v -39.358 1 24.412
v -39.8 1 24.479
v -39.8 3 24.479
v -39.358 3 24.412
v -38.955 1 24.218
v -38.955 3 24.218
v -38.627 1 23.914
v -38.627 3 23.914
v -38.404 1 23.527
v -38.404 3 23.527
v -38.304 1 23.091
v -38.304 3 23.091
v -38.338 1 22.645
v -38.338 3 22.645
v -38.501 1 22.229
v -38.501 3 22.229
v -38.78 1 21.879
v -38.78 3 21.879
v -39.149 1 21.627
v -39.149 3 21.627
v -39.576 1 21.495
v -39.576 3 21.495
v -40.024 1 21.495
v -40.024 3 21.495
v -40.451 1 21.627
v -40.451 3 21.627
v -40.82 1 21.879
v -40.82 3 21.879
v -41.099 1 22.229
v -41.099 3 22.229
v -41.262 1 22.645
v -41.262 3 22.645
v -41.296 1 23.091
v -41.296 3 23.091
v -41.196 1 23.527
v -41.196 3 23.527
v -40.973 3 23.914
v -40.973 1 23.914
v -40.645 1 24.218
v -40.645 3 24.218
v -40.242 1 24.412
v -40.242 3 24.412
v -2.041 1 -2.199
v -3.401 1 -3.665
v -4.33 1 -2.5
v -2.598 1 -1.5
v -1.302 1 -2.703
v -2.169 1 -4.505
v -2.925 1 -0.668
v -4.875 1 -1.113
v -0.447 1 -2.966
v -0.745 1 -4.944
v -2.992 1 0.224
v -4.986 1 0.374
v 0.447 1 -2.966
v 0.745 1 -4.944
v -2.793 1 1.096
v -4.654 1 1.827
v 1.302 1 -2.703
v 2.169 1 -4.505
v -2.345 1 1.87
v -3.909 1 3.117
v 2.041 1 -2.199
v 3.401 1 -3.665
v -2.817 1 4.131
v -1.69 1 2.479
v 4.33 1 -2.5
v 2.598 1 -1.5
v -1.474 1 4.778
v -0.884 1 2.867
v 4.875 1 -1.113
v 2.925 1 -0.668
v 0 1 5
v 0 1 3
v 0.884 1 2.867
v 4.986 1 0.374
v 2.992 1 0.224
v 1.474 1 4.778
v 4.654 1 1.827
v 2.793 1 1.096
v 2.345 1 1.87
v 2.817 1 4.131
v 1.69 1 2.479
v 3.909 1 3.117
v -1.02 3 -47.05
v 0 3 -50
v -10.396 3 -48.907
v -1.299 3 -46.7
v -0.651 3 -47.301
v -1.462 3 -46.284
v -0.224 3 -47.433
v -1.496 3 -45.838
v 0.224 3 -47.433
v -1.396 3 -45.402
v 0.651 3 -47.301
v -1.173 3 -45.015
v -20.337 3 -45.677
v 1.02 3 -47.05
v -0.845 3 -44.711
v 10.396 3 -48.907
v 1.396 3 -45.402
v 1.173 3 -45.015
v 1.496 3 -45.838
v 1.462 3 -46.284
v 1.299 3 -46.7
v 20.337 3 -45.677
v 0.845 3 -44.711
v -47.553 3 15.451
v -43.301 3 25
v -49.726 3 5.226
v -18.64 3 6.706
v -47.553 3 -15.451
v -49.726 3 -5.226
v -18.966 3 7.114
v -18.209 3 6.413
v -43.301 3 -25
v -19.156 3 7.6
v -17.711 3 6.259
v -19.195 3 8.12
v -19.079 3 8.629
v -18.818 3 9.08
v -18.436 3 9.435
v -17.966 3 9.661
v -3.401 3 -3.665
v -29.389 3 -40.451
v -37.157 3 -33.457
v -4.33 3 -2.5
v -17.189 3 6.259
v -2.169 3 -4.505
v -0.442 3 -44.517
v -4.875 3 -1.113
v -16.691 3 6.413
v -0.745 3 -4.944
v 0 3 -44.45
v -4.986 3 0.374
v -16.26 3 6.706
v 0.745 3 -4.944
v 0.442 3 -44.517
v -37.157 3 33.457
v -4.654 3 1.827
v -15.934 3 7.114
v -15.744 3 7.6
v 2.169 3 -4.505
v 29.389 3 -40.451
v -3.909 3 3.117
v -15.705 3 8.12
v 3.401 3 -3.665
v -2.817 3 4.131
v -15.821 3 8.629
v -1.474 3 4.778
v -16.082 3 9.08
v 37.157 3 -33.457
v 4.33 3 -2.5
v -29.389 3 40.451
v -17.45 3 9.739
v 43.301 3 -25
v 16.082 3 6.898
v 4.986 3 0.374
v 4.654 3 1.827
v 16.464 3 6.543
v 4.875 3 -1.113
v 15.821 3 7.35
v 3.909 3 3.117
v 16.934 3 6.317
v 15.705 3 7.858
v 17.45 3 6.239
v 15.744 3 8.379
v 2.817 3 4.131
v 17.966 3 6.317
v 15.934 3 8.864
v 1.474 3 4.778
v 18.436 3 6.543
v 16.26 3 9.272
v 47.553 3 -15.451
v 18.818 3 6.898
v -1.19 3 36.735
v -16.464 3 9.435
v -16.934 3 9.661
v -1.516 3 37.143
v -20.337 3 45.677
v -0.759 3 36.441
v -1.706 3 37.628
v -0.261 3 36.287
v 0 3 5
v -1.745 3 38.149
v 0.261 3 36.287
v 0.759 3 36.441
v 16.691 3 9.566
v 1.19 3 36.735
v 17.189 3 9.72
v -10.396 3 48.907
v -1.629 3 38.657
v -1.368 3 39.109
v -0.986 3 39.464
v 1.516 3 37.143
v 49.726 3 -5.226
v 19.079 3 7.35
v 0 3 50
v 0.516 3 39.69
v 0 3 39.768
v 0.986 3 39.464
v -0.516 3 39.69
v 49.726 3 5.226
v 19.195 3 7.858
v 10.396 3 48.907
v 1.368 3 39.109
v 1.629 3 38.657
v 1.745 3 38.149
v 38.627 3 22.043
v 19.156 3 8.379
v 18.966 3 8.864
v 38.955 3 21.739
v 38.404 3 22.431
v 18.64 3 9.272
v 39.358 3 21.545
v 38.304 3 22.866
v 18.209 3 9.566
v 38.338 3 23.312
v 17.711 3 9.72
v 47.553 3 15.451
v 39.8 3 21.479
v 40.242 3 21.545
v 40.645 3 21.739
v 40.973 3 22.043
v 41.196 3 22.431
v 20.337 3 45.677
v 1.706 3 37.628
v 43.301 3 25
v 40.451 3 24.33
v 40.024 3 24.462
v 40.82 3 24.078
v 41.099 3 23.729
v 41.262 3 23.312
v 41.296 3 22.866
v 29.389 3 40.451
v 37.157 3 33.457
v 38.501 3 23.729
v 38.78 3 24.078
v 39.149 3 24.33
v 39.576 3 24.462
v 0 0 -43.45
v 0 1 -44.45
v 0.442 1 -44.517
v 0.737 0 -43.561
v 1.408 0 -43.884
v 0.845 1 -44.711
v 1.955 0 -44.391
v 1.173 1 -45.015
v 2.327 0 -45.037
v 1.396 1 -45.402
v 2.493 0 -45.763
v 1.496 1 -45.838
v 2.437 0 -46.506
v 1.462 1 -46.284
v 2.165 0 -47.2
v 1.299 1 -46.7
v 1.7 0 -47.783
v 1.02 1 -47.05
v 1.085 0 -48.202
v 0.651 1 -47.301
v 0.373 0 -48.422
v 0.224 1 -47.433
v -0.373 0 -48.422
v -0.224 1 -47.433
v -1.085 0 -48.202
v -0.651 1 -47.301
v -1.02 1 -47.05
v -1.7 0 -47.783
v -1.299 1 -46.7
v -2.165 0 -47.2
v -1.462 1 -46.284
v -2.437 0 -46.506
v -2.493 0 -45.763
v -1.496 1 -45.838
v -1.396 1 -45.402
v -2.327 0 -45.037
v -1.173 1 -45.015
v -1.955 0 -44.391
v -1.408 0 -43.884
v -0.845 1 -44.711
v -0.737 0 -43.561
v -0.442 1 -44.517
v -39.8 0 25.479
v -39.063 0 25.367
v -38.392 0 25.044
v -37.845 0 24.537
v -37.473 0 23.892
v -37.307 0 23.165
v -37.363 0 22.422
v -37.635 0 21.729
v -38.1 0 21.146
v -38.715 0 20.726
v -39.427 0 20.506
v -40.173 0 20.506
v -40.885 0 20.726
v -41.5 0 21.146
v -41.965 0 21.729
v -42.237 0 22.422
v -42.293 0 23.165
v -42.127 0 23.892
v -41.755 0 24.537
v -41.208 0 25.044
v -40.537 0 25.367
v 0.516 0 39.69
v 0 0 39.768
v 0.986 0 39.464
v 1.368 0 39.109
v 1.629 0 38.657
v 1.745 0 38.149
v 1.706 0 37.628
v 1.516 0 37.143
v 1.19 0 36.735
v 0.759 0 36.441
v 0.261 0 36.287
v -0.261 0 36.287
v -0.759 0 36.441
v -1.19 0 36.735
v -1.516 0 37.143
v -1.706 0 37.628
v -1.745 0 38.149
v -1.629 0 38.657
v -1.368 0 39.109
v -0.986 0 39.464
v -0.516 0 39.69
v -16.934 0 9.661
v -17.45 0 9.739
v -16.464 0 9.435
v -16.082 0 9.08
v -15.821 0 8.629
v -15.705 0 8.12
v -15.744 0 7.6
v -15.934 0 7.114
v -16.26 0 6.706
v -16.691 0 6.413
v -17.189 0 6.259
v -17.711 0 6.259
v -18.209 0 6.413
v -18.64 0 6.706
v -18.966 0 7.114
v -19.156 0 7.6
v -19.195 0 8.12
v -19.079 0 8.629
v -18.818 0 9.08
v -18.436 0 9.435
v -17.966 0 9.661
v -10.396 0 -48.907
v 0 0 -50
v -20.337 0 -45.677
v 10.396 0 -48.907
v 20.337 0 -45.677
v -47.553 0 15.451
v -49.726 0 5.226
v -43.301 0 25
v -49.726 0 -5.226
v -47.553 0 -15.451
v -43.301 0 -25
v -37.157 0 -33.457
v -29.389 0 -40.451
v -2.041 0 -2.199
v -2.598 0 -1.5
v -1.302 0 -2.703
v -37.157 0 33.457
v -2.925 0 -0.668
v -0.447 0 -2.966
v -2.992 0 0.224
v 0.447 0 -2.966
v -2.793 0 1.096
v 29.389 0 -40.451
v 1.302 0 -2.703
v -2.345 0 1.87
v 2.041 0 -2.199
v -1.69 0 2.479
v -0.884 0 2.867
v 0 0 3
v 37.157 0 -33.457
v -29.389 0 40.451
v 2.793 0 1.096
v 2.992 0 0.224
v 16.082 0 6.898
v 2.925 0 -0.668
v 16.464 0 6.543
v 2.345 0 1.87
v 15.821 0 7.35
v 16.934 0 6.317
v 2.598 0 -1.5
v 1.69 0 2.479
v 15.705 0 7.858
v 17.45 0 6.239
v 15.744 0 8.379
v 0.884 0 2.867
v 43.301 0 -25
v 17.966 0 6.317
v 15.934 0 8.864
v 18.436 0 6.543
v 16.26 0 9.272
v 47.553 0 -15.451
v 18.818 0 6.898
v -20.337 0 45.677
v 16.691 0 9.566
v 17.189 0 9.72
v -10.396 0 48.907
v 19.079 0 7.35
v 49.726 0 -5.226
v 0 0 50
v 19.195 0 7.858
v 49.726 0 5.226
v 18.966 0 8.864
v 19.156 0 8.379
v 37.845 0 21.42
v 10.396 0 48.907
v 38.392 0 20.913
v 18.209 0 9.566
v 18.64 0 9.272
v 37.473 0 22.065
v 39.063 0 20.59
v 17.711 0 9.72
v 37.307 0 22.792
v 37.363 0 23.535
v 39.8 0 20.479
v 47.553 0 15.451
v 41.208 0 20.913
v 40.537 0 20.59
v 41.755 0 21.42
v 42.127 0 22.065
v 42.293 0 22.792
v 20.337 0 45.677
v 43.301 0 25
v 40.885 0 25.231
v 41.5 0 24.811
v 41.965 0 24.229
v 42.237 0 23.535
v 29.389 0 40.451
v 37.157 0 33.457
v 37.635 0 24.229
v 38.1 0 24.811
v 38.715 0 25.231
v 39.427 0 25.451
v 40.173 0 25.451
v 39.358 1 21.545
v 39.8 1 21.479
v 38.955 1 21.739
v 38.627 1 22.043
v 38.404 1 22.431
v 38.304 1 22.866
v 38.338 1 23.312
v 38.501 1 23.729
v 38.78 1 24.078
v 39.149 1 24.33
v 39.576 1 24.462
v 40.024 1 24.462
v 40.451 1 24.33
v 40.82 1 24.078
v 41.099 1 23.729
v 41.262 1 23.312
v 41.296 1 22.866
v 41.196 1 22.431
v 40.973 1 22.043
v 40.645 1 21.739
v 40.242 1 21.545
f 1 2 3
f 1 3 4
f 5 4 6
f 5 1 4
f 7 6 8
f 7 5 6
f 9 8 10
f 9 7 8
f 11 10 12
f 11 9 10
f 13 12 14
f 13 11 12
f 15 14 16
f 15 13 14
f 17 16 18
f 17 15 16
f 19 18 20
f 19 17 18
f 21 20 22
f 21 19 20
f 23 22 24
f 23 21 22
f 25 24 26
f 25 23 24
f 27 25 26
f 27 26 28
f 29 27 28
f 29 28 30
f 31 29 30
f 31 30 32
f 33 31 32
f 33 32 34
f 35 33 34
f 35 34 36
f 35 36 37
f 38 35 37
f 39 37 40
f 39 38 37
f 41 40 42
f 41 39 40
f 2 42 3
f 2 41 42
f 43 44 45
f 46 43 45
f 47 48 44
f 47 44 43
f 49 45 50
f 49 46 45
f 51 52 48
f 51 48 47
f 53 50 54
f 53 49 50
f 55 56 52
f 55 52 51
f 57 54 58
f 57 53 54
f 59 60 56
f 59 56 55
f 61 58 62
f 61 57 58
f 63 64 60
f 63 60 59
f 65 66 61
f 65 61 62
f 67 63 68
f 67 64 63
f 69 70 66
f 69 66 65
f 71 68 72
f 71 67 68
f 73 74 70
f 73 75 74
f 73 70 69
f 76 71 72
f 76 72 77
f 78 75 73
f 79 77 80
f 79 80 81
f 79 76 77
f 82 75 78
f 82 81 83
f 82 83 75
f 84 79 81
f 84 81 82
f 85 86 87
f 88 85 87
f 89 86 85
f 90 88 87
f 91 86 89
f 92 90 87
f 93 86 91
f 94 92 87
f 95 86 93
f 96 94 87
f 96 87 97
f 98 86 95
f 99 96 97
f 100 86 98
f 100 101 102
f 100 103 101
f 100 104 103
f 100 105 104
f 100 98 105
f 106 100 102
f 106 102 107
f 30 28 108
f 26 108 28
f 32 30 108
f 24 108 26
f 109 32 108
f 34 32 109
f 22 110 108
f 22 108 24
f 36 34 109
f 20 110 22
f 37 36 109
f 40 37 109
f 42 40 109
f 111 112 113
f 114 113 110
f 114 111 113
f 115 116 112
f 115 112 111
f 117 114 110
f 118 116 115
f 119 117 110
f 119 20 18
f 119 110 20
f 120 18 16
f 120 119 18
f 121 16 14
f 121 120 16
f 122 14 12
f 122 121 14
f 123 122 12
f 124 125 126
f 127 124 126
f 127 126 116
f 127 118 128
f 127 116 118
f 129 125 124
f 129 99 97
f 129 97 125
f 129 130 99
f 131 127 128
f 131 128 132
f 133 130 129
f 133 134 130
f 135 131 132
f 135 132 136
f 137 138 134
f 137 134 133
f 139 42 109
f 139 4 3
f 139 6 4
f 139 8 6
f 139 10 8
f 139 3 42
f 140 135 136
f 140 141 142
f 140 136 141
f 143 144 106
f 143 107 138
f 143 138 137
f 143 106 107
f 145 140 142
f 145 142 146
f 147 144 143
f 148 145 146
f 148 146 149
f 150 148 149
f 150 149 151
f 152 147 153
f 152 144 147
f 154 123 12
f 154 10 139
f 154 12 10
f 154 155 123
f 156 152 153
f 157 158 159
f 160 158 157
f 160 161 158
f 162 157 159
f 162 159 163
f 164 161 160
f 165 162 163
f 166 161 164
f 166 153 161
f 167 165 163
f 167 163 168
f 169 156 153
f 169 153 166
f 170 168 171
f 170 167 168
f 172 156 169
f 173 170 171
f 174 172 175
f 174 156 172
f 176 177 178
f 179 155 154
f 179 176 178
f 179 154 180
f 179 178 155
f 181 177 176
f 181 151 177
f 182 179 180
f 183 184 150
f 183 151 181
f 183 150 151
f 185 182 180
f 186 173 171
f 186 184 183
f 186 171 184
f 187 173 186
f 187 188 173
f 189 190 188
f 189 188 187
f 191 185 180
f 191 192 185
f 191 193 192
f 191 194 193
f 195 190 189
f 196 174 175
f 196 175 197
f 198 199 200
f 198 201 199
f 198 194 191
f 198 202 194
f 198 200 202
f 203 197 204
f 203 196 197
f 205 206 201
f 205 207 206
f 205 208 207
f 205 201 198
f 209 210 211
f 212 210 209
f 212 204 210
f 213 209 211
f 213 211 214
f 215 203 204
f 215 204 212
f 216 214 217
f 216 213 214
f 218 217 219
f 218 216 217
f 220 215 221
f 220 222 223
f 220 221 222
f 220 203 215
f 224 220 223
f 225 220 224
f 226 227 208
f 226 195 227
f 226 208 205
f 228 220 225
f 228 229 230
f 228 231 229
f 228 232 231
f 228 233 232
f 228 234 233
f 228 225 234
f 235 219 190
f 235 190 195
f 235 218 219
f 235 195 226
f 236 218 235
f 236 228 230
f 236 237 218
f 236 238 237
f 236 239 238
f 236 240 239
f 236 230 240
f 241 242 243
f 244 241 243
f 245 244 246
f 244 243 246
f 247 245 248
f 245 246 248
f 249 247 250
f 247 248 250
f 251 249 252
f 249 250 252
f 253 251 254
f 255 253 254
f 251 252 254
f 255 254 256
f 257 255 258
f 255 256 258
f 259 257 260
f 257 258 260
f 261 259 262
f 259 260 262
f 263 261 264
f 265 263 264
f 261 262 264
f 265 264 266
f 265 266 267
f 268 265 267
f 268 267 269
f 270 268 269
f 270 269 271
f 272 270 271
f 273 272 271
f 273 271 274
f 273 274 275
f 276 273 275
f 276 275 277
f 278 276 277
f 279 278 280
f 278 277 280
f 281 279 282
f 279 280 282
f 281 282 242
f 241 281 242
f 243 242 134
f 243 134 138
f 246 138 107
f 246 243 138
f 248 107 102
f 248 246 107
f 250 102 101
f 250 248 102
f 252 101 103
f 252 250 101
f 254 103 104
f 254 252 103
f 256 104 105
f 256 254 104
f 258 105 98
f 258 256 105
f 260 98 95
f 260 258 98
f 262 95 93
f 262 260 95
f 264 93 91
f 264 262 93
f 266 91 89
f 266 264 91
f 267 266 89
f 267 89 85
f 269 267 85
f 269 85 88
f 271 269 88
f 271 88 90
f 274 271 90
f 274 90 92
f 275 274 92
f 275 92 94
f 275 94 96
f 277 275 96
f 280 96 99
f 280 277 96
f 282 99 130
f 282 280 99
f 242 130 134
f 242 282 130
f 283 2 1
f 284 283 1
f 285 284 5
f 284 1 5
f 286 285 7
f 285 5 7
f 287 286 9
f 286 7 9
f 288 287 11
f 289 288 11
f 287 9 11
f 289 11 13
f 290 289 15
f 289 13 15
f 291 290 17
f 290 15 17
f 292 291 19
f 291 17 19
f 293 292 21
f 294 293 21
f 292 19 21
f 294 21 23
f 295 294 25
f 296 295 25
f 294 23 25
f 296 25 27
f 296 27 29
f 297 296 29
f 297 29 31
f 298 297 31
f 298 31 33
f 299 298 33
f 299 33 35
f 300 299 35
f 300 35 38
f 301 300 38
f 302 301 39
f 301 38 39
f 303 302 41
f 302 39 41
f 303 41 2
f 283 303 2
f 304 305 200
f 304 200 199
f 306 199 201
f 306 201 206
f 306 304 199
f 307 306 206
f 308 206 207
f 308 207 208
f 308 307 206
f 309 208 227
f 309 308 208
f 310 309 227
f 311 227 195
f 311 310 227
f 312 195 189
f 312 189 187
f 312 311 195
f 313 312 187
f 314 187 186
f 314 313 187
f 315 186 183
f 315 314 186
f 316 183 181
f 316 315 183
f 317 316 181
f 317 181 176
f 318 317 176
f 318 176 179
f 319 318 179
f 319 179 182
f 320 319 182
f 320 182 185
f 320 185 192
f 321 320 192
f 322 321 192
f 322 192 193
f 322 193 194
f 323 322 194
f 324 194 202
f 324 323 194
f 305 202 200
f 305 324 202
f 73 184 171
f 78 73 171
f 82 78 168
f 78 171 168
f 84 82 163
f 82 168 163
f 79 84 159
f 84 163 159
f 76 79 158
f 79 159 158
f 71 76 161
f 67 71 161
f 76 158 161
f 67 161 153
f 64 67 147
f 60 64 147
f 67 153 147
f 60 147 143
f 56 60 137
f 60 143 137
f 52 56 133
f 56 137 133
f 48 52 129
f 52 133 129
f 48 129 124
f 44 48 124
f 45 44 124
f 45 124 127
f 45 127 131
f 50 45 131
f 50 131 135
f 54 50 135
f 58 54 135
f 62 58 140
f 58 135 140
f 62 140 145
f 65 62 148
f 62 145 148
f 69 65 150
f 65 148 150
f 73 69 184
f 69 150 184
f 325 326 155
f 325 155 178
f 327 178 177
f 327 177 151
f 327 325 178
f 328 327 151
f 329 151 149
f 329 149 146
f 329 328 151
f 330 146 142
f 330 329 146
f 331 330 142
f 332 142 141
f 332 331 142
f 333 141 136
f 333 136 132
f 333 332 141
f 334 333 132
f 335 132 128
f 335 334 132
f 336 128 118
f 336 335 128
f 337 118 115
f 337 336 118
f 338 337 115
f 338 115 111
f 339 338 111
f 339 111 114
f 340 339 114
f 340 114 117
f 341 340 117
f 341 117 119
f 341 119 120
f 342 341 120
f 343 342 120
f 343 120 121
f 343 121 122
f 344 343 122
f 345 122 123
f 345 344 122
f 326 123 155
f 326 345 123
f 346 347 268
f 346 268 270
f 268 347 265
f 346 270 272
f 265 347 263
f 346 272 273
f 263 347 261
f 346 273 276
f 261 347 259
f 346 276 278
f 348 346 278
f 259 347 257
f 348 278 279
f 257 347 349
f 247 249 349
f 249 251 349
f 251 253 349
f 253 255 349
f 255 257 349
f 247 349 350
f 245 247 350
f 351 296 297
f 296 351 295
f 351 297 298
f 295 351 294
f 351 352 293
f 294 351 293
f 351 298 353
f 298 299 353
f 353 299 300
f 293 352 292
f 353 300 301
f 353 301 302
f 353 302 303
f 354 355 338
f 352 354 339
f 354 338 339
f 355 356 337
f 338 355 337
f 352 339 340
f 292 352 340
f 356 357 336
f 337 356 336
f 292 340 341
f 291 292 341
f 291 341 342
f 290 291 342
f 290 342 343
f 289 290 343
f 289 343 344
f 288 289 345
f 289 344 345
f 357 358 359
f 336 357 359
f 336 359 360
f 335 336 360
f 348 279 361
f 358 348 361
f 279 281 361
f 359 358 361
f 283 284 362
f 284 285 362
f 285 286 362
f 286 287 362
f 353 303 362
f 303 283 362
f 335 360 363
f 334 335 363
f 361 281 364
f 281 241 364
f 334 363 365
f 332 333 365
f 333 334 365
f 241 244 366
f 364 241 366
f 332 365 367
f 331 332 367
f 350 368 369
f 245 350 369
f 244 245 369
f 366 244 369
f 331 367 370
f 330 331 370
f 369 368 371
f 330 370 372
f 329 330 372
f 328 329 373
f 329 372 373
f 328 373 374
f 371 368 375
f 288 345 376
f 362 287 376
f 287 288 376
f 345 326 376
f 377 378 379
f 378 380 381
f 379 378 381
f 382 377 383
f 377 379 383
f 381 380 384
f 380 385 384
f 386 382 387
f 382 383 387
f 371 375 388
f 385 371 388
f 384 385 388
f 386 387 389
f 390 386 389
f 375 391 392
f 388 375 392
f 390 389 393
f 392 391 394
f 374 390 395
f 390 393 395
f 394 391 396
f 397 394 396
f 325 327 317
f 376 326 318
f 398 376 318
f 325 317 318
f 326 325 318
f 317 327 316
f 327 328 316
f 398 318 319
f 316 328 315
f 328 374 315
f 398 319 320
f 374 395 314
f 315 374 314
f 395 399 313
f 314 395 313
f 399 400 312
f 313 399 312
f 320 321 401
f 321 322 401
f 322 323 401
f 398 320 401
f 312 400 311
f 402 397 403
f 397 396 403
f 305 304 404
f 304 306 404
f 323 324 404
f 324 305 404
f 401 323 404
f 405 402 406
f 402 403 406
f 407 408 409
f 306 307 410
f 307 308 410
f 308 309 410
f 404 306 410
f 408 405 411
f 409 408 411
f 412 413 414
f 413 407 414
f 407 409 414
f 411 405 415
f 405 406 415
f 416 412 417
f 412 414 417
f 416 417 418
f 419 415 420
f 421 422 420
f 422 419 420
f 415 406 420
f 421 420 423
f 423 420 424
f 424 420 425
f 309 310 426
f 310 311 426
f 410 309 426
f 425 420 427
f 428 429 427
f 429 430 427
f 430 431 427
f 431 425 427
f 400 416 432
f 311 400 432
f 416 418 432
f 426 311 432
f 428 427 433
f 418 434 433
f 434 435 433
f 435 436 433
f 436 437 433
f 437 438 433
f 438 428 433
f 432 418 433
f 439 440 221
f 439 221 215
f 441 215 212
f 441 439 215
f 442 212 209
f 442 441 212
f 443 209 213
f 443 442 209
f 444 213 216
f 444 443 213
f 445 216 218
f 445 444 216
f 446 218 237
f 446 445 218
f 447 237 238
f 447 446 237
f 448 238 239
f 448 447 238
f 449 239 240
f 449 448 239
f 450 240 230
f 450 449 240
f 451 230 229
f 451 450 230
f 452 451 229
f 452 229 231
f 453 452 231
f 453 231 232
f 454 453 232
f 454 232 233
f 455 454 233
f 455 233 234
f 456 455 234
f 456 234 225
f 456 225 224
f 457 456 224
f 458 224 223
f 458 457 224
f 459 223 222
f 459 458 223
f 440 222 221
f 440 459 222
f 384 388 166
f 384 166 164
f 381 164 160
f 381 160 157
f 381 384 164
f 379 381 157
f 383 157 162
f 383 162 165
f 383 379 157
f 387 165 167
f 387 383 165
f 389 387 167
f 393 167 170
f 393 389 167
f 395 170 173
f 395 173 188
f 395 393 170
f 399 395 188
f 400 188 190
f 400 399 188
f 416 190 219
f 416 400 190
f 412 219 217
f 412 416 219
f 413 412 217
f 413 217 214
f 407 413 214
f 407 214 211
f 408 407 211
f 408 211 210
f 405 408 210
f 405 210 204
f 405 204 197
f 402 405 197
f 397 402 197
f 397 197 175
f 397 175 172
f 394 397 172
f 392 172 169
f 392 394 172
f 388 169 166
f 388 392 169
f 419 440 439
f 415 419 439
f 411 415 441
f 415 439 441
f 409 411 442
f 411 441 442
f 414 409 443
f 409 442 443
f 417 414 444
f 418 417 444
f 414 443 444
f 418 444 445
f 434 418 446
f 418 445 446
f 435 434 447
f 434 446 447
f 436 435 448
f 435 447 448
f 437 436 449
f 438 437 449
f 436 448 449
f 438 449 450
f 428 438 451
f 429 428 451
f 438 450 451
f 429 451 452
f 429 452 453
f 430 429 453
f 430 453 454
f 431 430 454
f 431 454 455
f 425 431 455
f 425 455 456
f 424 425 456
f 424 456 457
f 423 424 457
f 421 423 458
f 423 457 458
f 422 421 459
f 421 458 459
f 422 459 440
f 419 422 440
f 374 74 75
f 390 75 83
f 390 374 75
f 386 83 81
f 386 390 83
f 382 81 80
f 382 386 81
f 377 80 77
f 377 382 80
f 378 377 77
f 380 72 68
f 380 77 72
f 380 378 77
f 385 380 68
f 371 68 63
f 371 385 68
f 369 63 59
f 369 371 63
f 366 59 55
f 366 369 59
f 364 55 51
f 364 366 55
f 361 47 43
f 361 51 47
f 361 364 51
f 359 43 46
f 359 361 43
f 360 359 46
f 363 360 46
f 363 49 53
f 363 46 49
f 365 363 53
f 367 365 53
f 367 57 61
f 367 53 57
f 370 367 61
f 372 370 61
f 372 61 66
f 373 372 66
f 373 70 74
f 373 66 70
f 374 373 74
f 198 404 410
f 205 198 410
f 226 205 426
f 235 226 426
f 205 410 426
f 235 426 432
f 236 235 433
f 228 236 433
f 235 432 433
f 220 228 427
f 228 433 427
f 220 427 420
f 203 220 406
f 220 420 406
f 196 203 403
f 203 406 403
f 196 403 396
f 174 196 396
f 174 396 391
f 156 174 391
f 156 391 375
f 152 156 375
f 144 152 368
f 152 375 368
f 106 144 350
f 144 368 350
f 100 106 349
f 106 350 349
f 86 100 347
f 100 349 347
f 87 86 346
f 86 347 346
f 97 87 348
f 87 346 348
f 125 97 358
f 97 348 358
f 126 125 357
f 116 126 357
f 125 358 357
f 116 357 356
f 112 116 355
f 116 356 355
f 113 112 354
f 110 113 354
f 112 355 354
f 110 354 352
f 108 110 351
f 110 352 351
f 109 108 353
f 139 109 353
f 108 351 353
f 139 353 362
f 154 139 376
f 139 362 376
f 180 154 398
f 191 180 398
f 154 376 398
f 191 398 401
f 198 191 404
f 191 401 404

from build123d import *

# Parameters (mm, degrees)
SKETCH1_R           = 50
SKETCH1_R_2         = 3
SKETCH1_R_3         = 1.5
SKETCH1_R_4         = 1.75
BOSS_EXTRUDE1_DEPTH = 3
SKETCH2_R           = 5
CUT_EXTRUDE1_DEPTH  = 2
CHAMFER1_SIZE       = 1


with BuildPart() as part:
    # Sketch1 → Boss-Extrude1 (new body)
    with BuildSketch(Plane(origin=(0, 0, 0), x_dir=(1, 0, 0), z_dir=(0, 1, 0))):
        with Locations(Location((0, 0, 0), (0, 0, 270))):
            Circle(SKETCH1_R)
        with Locations(Location((0, 0, 0), (0, 0, 270))):
            Circle(SKETCH1_R_2, mode=Mode.SUBTRACT)
        with Locations(Location((-39.8, -22.978540714, 0), (0, 0, 270))):
            Circle(SKETCH1_R_3, mode=Mode.SUBTRACT)
        with Locations(Location((-17.45, -7.989233767, 0), (0, 0, 270))):
            Circle(SKETCH1_R_4, mode=Mode.SUBTRACT)
        with Locations(Location((0, 45.95, 0), (0, 0, 270))):
            Circle(SKETCH1_R_3, mode=Mode.SUBTRACT)
        with Locations(Location((0, -38.0178, 0), (0, 0, 270))):
            Circle(SKETCH1_R_4, mode=Mode.SUBTRACT)
        with Locations(Location((39.8, -22.978540714, 0), (0, 0, 90))):
            Circle(SKETCH1_R_3, mode=Mode.SUBTRACT)
        with Locations(Location((17.45, -7.989233767, 0), (0, 0, 90))):
            Circle(SKETCH1_R_4, mode=Mode.SUBTRACT)
    extrude(amount=BOSS_EXTRUDE1_DEPTH)

    # Sketch2 → Cut-Extrude1 (cut)
    with BuildSketch(Plane(origin=(0, 3, 0), x_dir=(1, 0, 0), z_dir=(0, 1, 0))):
        with Locations(Location((0, 0, 0), (0, 0, 270))):
            Circle(SKETCH2_R)
    extrude(amount=-CUT_EXTRUDE1_DEPTH, mode=Mode.SUBTRACT)

    # Chamfer1
    chamfer1_edges = [part.edges().sort_by_distance(p)[0] for p in [
        (0, 0, -47.45),
        (39.8, 0, 24.478540714),
        (-39.8, 0, 21.478540714),
    ]]
    chamfer(chamfer1_edges, length=CHAMFER1_SIZE)


solid = part.part
